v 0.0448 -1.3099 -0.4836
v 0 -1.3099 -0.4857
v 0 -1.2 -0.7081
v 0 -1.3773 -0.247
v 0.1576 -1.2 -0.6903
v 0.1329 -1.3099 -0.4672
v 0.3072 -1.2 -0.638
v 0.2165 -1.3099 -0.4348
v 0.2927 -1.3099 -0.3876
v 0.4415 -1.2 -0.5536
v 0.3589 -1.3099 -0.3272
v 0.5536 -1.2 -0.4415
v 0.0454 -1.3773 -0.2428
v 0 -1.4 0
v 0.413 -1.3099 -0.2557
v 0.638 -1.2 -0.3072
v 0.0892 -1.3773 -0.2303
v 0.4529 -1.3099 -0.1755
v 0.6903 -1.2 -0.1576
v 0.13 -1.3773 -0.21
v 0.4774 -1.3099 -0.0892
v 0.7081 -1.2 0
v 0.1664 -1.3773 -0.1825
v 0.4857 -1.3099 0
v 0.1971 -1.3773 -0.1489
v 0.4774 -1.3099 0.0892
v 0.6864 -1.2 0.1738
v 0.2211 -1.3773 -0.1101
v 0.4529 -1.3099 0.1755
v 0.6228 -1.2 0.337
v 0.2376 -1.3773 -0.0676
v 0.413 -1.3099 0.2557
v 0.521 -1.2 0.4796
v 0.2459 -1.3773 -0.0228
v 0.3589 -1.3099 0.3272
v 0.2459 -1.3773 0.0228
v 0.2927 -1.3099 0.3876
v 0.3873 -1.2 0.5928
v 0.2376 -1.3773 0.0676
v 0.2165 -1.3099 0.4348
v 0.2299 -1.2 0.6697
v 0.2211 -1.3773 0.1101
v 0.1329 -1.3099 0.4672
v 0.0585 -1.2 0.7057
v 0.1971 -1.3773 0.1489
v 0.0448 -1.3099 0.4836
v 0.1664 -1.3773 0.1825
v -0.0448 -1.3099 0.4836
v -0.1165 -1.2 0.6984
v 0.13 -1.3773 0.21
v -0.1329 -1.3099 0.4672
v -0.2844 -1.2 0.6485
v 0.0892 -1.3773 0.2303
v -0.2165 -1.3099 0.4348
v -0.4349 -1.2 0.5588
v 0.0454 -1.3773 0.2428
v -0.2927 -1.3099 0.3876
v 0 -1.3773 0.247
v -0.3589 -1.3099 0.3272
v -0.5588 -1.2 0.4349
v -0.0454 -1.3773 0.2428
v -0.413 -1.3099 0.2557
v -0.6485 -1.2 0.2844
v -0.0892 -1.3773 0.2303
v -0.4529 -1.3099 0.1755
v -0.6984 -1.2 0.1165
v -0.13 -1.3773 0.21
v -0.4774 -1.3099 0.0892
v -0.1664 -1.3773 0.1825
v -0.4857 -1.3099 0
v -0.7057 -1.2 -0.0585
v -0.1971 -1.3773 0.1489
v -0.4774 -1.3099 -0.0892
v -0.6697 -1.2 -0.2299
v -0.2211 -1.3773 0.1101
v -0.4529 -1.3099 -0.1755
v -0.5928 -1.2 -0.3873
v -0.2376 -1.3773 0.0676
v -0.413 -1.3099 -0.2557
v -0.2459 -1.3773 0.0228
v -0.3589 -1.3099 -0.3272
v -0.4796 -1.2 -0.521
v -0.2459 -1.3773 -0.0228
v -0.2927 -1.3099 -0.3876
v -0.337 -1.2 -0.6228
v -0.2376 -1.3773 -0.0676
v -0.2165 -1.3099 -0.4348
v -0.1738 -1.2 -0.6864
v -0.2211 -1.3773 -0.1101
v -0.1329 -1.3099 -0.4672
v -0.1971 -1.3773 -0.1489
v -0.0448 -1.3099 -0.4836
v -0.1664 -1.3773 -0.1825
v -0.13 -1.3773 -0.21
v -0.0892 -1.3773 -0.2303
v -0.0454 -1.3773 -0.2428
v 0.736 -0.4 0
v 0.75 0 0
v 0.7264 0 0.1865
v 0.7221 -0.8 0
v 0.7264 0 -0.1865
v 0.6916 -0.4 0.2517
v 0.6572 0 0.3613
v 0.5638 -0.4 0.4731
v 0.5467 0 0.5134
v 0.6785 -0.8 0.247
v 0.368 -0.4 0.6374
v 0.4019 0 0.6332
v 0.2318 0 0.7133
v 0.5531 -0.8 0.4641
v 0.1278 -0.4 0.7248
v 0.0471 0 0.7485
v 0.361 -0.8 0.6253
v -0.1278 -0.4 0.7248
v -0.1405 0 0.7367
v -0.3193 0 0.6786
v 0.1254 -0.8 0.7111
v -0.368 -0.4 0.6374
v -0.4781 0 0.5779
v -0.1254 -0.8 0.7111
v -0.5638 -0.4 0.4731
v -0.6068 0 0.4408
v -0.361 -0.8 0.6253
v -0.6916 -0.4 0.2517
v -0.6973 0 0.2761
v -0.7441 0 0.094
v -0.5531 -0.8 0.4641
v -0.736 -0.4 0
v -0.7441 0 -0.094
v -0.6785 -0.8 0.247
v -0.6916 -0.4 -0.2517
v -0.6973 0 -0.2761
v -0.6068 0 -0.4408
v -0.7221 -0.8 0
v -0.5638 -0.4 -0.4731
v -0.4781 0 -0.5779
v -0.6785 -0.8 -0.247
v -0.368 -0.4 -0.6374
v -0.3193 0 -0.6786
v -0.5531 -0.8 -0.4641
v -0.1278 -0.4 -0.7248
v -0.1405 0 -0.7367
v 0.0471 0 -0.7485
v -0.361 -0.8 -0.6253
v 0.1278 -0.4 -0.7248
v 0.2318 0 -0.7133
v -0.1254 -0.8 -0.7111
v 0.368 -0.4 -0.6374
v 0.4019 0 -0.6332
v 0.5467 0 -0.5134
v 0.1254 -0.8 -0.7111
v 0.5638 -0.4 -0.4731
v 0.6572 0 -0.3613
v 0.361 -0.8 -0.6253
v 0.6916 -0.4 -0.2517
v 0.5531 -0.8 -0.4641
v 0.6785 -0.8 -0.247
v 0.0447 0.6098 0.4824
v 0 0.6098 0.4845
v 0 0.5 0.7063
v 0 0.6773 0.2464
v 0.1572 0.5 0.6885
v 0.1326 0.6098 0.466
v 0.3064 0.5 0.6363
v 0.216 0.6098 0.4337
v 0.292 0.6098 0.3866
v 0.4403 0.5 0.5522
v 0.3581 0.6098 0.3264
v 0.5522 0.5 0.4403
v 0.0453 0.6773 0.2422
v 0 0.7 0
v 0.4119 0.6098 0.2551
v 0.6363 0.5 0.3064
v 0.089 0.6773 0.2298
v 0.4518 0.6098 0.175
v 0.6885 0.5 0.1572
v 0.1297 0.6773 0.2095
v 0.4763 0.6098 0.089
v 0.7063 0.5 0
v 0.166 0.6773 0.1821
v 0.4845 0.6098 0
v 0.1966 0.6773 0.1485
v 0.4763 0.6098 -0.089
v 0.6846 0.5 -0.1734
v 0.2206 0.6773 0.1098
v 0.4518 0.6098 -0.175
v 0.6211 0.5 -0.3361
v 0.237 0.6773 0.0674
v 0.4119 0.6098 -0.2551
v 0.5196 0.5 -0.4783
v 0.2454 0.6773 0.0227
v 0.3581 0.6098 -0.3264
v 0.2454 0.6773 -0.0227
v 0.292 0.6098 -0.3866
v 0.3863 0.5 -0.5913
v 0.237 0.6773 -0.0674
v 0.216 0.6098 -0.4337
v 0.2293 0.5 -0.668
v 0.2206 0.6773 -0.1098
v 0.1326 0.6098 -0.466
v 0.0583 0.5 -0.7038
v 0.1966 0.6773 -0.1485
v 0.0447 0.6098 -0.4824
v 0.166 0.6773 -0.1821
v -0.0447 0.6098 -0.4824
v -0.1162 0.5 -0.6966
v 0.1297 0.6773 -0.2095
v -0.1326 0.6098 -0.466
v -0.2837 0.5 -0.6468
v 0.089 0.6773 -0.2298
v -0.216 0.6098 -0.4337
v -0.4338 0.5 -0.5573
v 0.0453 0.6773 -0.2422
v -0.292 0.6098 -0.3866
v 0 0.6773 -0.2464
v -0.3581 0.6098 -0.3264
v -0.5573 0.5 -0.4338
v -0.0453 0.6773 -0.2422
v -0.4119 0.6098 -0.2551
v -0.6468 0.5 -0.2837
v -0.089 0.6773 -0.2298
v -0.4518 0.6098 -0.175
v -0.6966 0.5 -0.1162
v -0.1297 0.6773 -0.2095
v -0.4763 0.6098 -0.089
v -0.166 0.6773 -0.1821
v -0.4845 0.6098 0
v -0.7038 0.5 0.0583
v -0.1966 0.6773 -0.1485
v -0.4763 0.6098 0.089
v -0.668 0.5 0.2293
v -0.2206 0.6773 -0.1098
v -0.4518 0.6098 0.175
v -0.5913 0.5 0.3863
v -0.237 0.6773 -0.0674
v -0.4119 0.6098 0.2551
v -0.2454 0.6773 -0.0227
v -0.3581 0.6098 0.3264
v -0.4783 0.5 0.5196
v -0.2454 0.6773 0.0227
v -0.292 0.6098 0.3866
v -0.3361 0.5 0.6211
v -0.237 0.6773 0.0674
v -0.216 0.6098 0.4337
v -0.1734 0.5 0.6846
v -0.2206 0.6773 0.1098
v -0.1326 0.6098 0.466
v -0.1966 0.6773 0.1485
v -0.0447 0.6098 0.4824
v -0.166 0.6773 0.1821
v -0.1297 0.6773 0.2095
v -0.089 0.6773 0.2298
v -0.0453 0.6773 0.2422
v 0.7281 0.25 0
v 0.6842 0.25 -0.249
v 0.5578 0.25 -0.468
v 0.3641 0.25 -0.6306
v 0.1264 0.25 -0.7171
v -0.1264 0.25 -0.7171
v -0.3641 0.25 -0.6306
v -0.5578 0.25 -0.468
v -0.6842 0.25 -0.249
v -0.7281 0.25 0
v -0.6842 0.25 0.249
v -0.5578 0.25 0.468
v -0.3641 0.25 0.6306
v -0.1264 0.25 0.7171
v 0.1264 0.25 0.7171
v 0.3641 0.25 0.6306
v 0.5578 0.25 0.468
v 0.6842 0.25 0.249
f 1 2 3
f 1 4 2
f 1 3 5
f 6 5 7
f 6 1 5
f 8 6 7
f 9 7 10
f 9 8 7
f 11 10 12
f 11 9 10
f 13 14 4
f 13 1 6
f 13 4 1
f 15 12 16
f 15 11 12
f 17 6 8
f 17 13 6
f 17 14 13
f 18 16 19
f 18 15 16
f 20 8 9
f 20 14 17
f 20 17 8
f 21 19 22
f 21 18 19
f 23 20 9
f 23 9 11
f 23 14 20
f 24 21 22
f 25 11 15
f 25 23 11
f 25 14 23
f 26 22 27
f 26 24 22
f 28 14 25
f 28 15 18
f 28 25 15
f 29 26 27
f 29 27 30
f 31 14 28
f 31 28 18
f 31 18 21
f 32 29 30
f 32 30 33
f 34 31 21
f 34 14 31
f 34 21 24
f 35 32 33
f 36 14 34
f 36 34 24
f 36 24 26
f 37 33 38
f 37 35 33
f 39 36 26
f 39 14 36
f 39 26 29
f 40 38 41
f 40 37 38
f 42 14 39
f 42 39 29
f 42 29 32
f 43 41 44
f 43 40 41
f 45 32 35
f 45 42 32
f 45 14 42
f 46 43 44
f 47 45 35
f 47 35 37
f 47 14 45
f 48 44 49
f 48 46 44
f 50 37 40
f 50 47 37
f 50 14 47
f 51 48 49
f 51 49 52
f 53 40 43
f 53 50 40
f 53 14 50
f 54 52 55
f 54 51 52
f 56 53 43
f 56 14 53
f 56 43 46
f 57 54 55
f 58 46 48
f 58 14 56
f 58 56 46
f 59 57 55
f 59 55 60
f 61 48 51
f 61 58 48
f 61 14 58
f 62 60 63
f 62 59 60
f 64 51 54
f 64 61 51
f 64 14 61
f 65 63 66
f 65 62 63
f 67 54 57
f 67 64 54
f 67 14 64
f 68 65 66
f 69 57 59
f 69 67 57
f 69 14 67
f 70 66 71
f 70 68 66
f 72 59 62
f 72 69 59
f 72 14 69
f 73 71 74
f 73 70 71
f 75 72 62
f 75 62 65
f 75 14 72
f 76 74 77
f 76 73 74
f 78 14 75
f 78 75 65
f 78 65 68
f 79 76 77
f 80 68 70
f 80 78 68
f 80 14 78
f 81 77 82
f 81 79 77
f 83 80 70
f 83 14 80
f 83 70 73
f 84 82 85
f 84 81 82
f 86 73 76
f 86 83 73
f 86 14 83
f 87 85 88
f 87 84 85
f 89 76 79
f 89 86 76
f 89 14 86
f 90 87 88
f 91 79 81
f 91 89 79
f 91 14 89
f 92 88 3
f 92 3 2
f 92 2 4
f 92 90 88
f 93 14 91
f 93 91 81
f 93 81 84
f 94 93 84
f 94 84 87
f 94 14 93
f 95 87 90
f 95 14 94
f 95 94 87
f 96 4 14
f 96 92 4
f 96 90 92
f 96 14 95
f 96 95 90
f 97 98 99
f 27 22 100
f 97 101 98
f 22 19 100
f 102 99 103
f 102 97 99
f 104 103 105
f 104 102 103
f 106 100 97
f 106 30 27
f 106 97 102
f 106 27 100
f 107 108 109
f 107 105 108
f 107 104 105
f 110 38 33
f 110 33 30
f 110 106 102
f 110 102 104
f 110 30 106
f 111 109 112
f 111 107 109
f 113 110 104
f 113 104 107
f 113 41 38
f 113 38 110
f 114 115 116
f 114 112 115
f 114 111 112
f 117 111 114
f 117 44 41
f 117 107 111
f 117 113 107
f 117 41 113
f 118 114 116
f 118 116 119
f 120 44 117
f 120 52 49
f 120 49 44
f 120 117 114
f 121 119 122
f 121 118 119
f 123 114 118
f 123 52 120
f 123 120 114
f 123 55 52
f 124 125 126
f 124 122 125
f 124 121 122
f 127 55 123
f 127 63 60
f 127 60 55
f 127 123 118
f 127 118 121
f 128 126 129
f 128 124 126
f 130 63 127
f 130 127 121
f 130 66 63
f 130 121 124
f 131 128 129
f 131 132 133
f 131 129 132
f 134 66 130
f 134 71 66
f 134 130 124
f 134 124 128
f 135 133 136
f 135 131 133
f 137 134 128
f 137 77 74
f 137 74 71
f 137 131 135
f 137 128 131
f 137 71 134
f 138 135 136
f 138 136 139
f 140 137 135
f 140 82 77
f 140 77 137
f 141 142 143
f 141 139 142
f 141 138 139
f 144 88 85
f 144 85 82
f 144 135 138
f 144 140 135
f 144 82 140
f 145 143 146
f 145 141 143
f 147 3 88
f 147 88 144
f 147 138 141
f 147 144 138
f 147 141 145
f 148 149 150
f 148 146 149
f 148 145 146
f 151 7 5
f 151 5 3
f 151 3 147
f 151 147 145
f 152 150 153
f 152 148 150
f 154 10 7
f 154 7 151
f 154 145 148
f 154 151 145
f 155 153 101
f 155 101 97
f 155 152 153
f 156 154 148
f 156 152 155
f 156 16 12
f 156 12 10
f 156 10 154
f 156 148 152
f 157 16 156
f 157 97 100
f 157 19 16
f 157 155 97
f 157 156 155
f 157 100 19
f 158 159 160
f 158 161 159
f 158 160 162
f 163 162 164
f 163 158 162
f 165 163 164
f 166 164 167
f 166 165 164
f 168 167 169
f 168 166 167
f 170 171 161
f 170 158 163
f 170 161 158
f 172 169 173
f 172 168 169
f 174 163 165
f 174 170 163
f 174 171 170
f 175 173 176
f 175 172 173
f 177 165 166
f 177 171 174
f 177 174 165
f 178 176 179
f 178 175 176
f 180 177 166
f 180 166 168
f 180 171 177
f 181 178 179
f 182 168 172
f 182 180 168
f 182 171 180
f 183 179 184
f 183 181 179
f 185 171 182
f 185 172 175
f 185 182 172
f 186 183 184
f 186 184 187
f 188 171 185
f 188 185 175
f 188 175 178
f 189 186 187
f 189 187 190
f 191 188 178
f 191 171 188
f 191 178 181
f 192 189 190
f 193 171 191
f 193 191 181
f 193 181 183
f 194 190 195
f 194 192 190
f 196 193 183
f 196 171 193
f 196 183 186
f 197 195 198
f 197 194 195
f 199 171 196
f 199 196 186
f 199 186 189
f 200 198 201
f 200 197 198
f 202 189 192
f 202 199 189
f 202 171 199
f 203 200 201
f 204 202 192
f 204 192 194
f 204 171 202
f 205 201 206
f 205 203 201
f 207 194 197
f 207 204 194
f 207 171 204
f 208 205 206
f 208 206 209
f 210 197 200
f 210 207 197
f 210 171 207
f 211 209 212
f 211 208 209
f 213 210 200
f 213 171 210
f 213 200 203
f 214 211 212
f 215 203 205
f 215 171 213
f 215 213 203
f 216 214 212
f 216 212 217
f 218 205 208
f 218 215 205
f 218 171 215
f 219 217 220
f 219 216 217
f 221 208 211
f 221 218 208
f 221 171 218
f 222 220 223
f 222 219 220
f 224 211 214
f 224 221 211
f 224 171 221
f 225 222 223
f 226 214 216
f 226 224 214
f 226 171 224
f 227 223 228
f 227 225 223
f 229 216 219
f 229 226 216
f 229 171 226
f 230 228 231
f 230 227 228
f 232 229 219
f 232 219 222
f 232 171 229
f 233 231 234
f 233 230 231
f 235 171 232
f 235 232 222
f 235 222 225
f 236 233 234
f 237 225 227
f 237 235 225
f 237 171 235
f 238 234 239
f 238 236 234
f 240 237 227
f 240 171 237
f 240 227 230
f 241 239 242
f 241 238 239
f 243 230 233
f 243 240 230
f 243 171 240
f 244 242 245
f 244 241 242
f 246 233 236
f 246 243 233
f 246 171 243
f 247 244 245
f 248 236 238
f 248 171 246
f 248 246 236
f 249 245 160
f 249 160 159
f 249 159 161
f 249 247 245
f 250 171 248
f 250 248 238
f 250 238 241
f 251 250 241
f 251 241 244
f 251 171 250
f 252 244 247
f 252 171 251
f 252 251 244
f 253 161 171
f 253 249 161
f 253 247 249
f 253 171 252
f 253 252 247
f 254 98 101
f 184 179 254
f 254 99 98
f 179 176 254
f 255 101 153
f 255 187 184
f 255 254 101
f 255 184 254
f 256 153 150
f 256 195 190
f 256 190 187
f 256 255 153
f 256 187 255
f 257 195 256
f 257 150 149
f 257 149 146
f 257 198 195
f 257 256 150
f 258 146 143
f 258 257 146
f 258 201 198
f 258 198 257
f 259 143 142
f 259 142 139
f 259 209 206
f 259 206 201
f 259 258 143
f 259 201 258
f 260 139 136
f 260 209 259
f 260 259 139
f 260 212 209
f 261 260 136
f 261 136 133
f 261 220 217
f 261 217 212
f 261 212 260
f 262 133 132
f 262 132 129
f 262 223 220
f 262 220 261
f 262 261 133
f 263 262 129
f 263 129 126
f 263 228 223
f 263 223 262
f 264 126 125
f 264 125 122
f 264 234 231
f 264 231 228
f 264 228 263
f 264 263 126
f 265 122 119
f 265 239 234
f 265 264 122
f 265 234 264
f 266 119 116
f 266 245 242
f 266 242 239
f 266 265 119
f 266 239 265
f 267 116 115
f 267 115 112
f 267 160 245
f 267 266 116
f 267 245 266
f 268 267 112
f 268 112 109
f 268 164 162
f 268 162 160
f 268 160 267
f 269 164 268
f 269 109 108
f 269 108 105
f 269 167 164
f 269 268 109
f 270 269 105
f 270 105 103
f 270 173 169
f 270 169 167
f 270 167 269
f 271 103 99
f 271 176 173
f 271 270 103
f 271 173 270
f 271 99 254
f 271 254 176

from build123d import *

# Parameters (mm, degrees)
SKETCH1_R           = 0.75
BOSS_EXTRUDE1_DEPTH = 0.5
BOSS_EXTRUDE1_TAPER = 5
DOME1_FACE_RADIUS   = 0.706255668
DOME1_HEIGHT        = 0.2
SKETCH2_R           = 0.75
BOSS_EXTRUDE2_DEPTH = 1.2
BOSS_EXTRUDE2_TAPER = 2
DOME3_FACE_RADIUS   = 0.708095077
DOME3_HEIGHT        = 0.2


with BuildPart() as part:
    # Sketch1 → Boss-Extrude1 (new body)
    with BuildSketch(Plane(origin=(0, 0, 0), x_dir=(1, 0, 0), z_dir=(0, 1, 0))):
        Circle(SKETCH1_R)
    extrude(amount=BOSS_EXTRUDE1_DEPTH, taper=BOSS_EXTRUDE1_TAPER)

    # Dome1: a dome of height H over a round flat face of radius A is a cap of a sphere of radius (A * A + H * H) / (2 * H)
    dome1_r = (DOME1_FACE_RADIUS * DOME1_FACE_RADIUS + DOME1_HEIGHT * DOME1_HEIGHT) / (2 * DOME1_HEIGHT)
    dome1_base = Plane((0, 0.5, 0), z_dir=(0, 1, 0))
    with Locations(dome1_base.offset(DOME1_HEIGHT - dome1_r)):
        dome1_ball = Sphere(dome1_r, mode=Mode.PRIVATE)
    add(split(dome1_ball, bisect_by=dome1_base, keep=Keep.TOP, mode=Mode.PRIVATE))

    # Sketch2 → Boss-Extrude2 (add)
    with BuildSketch(Plane.XZ):
        Circle(SKETCH2_R)
    extrude(amount=BOSS_EXTRUDE2_DEPTH, taper=BOSS_EXTRUDE2_TAPER)

    # Dome3: a dome of height H over a round flat face of radius A is a cap of a sphere of radius (A * A + H * H) / (2 * H)
    dome3_r = (DOME3_FACE_RADIUS * DOME3_FACE_RADIUS + DOME3_HEIGHT * DOME3_HEIGHT) / (2 * DOME3_HEIGHT)
    dome3_base = Plane((0, -1.2, 0), z_dir=(0, -1, 0))
    with Locations(dome3_base.offset(DOME3_HEIGHT - dome3_r)):
        dome3_ball = Sphere(dome3_r, mode=Mode.PRIVATE)
    add(split(dome3_ball, bisect_by=dome3_base, keep=Keep.TOP, mode=Mode.PRIVATE))


solid = part.part
